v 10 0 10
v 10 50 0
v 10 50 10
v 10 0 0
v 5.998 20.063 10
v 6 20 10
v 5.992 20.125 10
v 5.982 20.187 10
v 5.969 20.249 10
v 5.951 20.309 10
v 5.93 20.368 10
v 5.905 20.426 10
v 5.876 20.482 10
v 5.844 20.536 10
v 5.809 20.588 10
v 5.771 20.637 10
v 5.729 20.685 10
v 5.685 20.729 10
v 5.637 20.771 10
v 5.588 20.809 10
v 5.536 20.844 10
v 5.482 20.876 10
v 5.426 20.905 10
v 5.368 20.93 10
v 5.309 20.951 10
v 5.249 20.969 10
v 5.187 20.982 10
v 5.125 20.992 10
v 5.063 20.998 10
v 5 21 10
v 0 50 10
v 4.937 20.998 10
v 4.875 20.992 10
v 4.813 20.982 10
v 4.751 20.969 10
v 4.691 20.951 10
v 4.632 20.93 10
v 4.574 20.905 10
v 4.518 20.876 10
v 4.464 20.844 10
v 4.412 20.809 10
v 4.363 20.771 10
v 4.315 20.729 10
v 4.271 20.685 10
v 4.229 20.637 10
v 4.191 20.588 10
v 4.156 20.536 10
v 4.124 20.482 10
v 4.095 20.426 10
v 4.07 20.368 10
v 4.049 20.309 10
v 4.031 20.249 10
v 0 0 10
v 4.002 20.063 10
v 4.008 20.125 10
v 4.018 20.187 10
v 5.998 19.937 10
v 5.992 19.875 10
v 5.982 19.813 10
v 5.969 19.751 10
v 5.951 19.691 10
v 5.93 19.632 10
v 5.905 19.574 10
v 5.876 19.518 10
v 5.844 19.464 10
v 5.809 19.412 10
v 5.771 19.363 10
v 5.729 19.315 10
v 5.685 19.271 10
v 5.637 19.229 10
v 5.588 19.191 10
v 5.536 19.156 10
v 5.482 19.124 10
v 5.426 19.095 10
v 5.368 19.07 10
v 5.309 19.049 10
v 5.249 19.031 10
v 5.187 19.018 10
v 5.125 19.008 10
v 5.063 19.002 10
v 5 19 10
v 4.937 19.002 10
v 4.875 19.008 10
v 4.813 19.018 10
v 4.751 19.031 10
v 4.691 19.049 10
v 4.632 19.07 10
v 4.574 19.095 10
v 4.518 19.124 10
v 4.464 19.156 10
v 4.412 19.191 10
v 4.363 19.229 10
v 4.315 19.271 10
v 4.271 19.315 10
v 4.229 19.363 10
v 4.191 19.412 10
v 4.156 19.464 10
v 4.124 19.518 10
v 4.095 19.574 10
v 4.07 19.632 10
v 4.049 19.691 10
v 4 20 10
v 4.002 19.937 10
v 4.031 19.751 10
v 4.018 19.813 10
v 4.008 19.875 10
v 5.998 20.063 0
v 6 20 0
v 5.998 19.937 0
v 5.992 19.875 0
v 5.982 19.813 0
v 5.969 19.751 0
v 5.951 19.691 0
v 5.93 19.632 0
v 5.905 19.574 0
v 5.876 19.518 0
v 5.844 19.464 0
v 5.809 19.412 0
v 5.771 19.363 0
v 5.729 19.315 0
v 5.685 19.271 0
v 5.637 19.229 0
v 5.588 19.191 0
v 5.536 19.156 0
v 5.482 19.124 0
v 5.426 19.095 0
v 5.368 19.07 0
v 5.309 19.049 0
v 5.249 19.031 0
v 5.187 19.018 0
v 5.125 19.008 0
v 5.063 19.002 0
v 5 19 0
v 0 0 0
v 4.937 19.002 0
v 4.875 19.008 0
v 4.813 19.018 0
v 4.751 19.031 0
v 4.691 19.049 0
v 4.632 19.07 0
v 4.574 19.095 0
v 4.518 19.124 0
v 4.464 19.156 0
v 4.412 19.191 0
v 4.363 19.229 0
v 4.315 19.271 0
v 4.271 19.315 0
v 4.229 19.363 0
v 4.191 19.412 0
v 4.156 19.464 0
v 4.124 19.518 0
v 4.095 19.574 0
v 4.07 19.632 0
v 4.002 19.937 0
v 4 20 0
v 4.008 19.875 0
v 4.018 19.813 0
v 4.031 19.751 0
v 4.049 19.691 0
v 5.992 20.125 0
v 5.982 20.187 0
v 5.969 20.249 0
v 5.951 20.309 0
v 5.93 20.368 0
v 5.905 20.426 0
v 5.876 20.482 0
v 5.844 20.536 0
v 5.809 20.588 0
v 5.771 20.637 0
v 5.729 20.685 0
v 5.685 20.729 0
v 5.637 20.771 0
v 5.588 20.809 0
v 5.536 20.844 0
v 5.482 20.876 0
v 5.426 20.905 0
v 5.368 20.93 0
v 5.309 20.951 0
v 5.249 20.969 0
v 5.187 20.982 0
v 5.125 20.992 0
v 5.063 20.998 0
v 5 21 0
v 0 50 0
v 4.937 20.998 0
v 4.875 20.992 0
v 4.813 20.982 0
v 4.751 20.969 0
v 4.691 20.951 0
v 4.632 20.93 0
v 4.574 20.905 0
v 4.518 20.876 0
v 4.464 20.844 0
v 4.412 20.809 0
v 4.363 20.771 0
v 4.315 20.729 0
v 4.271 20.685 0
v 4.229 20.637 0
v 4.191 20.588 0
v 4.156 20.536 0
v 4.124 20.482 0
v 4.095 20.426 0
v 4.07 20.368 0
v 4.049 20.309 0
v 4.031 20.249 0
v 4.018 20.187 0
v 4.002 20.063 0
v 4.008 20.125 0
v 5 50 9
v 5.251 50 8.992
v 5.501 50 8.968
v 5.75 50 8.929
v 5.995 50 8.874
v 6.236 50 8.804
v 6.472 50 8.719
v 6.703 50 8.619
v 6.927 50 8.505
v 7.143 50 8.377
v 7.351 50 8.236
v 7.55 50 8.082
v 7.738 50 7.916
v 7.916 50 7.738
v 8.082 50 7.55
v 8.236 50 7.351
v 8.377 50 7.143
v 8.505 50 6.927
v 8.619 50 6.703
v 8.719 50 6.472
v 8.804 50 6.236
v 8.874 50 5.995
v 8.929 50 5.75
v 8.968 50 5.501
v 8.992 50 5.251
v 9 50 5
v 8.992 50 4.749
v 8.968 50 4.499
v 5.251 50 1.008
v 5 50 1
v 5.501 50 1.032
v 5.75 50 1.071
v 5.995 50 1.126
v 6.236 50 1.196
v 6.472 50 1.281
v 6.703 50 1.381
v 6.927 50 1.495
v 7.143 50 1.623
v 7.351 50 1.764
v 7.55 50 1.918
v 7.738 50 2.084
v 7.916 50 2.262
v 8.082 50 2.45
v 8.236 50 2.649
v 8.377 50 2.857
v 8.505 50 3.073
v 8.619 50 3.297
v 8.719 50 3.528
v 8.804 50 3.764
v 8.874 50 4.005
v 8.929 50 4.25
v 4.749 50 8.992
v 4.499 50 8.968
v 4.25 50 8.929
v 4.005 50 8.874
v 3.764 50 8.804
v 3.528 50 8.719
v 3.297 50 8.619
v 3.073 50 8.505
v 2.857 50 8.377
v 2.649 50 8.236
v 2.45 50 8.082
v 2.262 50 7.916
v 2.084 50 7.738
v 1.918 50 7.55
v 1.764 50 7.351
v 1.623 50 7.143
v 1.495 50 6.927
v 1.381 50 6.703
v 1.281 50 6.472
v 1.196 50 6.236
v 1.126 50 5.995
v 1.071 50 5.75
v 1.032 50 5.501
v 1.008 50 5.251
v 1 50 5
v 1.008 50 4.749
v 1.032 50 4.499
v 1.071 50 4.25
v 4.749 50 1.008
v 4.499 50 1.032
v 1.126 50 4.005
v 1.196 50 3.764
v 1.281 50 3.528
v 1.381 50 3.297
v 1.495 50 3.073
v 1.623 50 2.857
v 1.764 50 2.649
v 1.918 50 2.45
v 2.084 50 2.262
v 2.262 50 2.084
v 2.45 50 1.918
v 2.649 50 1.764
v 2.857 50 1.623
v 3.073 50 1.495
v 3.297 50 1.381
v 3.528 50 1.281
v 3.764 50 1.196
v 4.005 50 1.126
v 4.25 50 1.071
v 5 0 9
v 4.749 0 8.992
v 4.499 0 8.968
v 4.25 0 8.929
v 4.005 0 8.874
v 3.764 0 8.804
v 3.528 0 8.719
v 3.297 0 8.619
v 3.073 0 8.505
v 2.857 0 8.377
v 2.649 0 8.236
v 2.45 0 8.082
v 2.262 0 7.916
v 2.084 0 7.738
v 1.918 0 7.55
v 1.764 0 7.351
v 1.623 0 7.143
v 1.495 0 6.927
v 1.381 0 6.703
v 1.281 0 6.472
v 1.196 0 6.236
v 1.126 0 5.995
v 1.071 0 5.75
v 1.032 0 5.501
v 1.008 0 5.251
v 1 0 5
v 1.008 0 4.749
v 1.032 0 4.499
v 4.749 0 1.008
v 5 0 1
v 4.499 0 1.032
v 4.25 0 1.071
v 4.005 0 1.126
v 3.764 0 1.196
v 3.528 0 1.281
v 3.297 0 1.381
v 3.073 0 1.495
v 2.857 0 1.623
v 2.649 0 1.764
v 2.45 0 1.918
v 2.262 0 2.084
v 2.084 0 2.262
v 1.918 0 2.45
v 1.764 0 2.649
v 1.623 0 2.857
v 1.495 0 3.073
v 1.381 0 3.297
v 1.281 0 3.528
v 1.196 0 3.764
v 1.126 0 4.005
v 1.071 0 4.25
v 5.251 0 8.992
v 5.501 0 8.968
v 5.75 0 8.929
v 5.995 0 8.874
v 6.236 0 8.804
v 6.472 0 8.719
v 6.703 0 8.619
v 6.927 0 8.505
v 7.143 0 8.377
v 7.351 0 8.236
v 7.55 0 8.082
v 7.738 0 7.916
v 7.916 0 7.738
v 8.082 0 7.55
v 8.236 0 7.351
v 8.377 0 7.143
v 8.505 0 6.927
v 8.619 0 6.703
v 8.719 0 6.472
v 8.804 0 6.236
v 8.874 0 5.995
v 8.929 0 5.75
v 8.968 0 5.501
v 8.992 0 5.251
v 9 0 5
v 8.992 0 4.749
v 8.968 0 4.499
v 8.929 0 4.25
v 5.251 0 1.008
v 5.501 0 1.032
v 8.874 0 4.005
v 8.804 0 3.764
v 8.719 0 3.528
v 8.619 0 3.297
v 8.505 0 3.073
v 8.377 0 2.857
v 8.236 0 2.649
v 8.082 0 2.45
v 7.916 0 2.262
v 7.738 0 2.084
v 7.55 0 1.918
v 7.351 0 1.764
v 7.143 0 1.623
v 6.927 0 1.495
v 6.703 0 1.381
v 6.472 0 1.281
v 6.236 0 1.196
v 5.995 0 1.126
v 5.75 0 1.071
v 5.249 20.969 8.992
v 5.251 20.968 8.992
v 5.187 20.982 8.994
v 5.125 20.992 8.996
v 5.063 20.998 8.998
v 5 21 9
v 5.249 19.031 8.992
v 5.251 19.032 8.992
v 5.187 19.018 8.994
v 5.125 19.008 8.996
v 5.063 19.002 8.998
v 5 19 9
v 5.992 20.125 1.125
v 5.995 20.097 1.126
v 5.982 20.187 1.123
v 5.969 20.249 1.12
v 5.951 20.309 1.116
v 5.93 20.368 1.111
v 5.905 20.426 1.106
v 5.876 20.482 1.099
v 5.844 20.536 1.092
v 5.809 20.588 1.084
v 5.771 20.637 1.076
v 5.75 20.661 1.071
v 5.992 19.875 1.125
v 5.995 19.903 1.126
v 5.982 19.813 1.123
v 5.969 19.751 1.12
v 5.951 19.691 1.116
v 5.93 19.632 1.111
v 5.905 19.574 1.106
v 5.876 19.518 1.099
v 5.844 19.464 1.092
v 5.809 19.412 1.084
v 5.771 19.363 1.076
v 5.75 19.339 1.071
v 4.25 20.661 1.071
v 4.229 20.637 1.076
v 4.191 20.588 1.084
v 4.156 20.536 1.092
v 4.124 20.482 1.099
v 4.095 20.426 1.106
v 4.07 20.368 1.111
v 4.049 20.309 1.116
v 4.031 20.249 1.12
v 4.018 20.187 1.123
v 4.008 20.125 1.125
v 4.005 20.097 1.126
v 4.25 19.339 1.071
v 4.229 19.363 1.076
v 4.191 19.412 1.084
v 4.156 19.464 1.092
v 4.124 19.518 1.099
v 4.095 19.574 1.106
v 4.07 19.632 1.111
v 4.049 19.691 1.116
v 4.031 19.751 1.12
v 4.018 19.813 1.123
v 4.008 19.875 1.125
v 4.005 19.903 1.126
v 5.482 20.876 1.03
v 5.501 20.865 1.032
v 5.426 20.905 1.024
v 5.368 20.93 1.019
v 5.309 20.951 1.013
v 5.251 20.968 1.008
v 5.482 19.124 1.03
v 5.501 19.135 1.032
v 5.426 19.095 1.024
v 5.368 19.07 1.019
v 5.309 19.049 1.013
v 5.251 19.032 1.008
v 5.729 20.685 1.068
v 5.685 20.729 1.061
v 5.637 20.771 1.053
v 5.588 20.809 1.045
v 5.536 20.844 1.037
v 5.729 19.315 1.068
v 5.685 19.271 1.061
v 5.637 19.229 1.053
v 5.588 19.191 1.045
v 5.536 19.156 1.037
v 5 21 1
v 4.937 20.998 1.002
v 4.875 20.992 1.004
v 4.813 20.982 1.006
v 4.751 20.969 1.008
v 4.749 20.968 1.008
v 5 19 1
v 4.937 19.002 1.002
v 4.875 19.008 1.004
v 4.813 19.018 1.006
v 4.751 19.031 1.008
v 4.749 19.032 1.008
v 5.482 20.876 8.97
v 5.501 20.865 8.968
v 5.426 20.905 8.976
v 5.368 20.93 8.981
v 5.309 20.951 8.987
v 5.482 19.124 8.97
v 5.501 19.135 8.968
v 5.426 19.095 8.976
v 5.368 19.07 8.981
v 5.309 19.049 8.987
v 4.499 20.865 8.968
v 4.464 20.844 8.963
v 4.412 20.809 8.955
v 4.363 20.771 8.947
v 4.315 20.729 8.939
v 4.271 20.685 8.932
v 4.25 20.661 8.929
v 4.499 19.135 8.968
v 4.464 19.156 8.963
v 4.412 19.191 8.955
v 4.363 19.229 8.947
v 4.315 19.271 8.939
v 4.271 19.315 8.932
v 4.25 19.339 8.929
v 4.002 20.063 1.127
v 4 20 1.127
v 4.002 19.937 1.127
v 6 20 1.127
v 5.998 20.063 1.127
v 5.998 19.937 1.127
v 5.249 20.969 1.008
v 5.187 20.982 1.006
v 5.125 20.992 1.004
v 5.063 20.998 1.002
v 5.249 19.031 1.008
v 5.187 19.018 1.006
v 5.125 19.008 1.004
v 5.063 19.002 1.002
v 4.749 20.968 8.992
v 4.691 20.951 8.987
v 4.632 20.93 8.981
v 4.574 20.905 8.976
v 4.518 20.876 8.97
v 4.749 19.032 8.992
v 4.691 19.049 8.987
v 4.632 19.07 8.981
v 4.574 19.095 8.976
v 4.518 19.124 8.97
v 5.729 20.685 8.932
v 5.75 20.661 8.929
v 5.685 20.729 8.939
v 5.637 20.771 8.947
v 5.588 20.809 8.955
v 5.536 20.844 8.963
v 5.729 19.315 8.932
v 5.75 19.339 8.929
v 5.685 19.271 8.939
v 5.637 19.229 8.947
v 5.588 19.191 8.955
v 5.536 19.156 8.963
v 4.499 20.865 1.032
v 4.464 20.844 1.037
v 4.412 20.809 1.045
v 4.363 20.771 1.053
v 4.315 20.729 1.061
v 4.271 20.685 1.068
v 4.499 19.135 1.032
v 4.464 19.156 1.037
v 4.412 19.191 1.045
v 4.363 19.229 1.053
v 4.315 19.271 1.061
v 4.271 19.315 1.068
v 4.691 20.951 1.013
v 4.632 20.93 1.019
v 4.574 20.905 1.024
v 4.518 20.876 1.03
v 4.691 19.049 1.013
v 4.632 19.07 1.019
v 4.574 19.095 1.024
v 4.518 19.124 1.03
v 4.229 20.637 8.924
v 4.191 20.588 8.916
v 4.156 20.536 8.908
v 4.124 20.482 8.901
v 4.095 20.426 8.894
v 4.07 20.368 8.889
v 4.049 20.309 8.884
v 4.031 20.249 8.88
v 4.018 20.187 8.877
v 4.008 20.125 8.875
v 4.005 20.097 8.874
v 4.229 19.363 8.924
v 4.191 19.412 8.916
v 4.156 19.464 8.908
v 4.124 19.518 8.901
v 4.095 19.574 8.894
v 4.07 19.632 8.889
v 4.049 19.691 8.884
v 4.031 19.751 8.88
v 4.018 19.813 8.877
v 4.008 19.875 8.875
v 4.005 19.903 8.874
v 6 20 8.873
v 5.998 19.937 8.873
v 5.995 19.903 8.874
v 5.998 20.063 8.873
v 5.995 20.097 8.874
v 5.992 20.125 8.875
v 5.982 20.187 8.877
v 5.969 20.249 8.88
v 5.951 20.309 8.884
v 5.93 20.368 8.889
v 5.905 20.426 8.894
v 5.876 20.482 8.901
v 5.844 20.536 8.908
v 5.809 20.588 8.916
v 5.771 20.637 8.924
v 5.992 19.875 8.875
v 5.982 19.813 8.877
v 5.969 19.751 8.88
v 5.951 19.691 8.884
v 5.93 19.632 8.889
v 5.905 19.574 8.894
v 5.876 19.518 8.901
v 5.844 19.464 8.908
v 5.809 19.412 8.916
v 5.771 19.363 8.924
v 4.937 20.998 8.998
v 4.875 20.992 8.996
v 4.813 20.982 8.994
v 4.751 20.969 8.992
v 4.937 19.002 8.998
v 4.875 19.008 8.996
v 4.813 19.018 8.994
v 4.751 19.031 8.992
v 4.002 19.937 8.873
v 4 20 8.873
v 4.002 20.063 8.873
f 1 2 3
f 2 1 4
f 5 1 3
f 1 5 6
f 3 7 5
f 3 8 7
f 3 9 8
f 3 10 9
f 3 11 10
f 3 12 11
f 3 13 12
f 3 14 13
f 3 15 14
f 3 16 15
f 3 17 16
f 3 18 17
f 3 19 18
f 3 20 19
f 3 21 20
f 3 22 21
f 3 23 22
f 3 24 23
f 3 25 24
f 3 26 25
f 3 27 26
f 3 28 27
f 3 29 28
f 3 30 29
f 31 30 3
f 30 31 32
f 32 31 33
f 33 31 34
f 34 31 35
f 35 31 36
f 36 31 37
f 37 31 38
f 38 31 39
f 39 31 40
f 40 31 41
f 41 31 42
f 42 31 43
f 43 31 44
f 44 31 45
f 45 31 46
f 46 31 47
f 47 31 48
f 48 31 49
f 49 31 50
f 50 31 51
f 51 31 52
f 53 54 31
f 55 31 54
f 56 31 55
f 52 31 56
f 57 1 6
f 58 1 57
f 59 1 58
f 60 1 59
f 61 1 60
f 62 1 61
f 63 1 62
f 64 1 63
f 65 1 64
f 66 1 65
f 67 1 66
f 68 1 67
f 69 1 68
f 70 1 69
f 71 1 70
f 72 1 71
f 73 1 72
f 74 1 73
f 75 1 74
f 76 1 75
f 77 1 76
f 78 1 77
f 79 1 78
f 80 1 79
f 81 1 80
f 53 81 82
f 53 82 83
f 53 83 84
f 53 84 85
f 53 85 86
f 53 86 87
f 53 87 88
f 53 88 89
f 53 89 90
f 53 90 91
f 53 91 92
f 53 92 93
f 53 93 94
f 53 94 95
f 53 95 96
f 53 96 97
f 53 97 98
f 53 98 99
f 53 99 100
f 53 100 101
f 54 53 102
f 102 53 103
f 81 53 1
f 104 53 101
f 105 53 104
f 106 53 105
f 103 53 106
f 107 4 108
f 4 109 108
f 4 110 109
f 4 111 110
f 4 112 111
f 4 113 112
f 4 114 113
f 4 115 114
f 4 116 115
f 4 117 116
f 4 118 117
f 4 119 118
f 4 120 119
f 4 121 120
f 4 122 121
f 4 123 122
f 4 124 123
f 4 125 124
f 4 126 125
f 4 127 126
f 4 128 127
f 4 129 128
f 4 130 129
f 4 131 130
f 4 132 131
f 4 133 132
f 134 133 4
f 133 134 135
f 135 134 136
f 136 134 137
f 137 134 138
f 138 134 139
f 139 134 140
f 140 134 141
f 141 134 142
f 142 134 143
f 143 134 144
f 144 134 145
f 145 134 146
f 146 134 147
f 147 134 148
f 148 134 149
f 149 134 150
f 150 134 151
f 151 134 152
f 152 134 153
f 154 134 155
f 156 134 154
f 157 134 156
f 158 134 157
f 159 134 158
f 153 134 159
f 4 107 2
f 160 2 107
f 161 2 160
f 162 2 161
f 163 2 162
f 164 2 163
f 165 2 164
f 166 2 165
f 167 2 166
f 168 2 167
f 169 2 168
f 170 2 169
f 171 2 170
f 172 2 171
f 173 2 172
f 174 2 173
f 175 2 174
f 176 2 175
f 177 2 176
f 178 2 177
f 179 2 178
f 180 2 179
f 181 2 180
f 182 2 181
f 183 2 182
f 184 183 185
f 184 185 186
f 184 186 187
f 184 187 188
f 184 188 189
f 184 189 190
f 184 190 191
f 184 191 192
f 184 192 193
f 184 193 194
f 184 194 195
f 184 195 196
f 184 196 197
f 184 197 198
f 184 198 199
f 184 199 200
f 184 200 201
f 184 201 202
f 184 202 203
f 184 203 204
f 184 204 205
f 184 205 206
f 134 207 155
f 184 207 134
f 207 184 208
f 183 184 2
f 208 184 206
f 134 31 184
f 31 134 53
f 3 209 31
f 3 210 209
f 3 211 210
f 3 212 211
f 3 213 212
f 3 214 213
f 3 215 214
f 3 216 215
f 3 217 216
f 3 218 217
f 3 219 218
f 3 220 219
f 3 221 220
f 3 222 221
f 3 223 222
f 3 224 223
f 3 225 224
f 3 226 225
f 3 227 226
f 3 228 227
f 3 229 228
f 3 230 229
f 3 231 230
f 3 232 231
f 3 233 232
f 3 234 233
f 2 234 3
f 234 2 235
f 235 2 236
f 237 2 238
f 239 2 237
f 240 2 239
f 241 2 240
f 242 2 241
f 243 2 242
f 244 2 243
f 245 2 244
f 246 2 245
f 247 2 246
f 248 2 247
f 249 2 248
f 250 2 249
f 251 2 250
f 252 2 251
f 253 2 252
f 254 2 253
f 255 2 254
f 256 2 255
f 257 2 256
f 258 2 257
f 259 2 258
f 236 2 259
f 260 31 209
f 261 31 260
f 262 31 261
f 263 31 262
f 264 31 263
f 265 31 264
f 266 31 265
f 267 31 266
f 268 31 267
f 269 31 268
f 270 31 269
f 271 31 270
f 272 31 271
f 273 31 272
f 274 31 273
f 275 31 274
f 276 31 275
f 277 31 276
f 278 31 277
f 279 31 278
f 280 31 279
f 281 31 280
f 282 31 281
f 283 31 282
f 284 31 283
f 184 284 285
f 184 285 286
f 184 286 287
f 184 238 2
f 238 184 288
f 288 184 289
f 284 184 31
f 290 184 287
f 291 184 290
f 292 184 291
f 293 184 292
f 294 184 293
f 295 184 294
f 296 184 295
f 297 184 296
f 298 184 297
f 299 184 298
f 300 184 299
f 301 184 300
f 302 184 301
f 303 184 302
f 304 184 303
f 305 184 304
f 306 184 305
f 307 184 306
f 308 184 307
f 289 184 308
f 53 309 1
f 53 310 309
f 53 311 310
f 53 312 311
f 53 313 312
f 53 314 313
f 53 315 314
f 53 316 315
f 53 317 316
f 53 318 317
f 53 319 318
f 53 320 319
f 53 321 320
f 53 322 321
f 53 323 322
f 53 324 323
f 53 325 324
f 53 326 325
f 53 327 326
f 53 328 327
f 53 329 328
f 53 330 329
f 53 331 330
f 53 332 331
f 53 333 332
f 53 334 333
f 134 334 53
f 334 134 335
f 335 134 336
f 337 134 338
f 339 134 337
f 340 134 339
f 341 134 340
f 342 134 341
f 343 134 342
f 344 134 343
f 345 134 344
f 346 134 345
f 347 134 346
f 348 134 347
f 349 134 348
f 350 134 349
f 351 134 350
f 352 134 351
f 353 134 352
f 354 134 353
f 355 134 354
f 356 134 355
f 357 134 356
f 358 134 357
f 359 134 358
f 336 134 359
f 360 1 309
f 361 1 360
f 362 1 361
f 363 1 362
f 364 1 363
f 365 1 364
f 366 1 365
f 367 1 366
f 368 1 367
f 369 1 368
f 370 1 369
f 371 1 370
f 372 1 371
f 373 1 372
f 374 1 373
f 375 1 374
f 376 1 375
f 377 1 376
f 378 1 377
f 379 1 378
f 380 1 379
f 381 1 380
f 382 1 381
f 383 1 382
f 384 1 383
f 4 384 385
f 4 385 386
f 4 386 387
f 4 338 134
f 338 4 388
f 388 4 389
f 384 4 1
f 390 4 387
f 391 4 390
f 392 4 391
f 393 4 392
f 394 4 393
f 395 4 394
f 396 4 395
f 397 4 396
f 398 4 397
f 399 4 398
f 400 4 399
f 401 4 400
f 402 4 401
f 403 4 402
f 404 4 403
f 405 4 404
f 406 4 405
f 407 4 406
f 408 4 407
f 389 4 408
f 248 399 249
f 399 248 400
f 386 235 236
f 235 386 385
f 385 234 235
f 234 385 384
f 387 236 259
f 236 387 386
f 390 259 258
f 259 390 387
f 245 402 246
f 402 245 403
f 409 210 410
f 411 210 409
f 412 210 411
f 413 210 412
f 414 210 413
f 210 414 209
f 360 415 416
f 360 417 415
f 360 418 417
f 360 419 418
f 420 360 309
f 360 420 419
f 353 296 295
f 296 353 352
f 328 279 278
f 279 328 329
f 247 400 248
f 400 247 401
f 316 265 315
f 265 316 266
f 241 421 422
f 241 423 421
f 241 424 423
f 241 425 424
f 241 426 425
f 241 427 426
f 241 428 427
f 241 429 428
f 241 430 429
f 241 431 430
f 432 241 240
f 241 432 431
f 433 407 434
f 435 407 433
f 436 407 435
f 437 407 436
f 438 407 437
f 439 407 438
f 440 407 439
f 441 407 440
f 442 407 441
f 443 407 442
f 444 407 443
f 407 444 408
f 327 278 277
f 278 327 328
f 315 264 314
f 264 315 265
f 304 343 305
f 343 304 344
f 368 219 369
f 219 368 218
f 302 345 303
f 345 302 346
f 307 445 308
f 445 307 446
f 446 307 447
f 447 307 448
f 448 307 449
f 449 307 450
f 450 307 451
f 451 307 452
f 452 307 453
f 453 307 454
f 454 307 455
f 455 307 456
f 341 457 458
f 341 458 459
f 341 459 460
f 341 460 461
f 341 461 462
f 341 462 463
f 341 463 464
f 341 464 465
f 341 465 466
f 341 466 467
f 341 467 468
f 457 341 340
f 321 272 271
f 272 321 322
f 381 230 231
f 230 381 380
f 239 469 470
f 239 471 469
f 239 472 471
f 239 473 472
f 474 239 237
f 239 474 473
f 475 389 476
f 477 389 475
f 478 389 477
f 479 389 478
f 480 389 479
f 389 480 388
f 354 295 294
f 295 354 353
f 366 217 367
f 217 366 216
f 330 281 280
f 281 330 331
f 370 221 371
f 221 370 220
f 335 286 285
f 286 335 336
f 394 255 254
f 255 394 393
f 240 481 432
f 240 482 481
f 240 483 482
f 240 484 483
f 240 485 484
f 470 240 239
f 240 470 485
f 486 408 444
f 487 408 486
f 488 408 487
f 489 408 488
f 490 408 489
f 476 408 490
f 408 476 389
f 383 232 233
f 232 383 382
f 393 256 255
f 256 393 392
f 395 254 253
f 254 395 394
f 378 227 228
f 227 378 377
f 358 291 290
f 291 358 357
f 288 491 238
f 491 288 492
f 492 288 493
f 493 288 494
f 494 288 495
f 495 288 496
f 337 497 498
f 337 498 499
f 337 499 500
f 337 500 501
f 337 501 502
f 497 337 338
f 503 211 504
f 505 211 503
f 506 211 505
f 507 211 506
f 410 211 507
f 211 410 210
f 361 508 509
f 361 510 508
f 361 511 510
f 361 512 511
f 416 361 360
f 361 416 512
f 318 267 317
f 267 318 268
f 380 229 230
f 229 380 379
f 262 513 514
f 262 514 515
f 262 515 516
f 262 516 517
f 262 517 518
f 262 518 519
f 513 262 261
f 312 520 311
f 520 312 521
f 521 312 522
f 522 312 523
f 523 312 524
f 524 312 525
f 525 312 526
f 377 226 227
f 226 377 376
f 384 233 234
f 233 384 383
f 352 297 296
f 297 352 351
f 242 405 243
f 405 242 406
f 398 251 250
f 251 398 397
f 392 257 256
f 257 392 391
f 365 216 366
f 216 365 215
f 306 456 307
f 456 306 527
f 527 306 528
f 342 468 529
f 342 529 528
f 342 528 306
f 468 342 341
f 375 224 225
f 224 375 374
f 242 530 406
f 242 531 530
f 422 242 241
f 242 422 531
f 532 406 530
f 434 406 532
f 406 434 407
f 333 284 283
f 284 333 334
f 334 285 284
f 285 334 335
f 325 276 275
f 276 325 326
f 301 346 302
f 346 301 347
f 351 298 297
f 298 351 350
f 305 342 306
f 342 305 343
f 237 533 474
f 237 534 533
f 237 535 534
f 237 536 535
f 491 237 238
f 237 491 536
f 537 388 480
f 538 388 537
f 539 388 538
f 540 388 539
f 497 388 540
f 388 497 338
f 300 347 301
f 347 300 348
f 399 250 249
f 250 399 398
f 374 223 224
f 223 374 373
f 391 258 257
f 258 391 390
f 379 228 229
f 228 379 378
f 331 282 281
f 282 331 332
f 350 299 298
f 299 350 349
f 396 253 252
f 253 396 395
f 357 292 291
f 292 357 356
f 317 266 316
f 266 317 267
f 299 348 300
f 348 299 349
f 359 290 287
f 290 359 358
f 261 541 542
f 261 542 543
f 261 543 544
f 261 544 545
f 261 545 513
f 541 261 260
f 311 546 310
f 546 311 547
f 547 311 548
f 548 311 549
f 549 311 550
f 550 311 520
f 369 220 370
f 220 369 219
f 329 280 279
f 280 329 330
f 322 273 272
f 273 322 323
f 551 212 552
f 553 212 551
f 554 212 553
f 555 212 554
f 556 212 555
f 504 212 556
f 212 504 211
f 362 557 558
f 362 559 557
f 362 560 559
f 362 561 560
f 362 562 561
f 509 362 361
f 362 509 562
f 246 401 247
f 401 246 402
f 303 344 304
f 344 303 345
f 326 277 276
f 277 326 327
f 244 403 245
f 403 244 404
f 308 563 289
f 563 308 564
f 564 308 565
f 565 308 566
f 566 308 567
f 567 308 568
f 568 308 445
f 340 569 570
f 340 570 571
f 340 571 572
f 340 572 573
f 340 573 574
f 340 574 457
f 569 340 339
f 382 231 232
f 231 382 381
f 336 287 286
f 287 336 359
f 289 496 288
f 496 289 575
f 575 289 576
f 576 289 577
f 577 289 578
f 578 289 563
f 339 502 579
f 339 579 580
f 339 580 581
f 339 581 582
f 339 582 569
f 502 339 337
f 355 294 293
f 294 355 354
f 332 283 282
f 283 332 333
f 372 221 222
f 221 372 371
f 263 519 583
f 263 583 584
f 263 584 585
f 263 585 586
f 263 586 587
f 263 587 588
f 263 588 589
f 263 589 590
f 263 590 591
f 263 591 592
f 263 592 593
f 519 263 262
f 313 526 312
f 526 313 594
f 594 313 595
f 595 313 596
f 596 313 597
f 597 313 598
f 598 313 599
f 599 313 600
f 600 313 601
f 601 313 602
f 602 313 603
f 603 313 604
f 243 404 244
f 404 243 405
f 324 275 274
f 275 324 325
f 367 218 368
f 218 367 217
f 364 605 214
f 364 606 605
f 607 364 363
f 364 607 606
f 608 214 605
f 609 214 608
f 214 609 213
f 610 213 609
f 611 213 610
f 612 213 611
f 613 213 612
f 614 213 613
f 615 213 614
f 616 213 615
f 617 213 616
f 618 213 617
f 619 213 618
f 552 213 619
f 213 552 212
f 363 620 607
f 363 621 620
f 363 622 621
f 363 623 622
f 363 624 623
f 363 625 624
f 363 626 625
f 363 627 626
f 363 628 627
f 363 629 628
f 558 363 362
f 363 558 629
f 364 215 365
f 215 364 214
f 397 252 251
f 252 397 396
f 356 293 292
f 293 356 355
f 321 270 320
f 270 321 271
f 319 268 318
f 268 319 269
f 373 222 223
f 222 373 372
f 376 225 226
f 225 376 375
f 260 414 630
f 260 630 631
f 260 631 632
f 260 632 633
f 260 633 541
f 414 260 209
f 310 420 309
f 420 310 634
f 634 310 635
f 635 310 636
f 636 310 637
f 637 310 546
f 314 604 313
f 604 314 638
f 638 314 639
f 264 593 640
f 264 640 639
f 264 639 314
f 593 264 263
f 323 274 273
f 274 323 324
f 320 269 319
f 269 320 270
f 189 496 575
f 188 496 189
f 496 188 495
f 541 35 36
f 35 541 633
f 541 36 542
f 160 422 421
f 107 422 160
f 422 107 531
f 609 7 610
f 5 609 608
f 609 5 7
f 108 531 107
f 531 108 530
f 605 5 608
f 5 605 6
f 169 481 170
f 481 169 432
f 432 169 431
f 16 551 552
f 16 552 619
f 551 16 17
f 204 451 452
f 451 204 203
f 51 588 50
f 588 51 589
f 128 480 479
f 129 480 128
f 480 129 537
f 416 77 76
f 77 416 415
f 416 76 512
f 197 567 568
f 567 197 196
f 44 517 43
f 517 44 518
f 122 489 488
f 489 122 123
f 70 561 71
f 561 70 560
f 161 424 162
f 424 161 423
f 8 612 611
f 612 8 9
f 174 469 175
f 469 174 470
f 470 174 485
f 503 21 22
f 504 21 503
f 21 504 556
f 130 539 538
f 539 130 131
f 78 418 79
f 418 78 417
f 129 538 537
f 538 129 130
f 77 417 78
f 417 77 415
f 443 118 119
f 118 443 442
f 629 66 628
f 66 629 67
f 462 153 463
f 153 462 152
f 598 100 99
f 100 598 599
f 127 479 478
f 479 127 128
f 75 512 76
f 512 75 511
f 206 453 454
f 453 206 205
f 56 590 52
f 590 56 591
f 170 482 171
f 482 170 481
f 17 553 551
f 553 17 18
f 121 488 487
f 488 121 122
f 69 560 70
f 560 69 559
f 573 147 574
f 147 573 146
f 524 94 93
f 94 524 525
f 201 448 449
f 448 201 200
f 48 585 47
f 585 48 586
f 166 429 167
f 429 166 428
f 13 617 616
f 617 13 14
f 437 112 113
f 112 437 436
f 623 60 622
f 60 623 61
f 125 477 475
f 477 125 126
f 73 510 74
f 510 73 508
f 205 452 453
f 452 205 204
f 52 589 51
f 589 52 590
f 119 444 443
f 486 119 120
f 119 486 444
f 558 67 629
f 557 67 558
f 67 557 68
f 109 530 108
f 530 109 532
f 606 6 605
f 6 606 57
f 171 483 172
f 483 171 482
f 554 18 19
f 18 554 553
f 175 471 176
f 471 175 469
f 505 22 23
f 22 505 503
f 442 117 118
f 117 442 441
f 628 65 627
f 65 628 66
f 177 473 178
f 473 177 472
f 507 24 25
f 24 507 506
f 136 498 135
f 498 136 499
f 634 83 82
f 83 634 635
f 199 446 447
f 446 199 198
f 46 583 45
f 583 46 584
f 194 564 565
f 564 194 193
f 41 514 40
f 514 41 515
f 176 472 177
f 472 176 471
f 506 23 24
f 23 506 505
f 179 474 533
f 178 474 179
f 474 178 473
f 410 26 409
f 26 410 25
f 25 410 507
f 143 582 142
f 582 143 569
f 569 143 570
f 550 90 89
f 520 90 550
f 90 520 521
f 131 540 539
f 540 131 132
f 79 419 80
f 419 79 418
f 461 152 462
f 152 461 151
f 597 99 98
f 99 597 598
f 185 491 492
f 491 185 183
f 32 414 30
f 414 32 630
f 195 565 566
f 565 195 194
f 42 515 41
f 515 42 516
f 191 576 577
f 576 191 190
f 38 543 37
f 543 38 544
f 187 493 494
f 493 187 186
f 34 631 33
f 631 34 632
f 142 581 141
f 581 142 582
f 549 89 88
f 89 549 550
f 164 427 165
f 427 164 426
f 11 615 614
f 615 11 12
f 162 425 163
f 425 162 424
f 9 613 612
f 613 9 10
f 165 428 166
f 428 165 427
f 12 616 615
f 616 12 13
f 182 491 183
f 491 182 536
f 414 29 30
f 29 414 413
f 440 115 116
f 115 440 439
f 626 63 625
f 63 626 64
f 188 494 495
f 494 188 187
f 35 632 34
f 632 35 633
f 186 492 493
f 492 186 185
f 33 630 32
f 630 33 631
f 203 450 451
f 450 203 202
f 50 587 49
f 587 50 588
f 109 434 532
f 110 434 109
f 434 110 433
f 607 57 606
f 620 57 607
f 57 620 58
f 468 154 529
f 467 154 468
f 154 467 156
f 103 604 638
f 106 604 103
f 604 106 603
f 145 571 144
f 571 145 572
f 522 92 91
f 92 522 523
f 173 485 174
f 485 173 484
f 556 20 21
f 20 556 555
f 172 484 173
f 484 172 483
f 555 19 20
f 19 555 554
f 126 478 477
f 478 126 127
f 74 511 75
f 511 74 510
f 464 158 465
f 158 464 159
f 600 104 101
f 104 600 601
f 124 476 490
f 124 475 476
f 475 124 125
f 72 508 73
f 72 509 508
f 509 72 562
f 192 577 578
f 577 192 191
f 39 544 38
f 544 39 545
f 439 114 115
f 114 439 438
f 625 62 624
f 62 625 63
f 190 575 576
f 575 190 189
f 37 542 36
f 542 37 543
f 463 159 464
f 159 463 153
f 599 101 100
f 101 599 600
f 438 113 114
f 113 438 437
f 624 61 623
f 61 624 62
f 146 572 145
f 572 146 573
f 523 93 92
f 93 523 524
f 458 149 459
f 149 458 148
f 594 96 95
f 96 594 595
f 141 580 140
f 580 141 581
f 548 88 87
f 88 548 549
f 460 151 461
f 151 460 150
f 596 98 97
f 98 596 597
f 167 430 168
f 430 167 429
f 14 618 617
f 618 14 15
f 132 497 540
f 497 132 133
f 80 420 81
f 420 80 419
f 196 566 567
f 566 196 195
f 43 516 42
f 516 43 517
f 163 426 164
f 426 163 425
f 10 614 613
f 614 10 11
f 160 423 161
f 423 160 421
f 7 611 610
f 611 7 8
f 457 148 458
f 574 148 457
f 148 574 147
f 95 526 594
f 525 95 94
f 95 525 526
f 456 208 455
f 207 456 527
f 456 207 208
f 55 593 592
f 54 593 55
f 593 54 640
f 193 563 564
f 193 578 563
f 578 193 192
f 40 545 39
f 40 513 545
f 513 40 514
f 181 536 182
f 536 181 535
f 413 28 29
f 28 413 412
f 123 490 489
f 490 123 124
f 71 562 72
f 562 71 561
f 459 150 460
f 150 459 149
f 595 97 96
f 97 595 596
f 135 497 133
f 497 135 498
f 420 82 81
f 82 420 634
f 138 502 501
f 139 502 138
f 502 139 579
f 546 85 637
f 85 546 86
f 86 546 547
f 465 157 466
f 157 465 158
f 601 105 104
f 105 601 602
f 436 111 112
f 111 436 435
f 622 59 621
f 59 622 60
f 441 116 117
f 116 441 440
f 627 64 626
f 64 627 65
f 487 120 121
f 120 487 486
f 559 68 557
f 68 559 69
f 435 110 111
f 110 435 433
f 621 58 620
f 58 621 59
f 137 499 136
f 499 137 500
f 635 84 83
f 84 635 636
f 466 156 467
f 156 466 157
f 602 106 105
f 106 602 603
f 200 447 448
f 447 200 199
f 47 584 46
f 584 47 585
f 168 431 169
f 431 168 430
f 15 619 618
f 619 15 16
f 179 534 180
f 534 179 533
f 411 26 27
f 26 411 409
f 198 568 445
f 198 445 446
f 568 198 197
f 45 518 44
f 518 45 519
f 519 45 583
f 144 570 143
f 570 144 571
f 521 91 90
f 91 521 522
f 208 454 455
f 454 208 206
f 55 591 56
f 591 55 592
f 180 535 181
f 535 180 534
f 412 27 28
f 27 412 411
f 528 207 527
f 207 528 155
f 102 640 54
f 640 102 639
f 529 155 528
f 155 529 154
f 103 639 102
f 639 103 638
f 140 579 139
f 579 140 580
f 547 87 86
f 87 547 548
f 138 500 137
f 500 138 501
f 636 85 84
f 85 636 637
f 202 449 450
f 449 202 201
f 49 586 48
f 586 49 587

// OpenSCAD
$fn=100;
difference(){
    cube([10,50,10]);
    rotate([-90,0,0]){
        translate([5,-5,-5]){
            cylinder(h=60,r=4);
        }
    }
    rotate([0,0,0]){
        translate([5,20,0]){
            cylinder(h=50,r=1);
        }
    }
}
